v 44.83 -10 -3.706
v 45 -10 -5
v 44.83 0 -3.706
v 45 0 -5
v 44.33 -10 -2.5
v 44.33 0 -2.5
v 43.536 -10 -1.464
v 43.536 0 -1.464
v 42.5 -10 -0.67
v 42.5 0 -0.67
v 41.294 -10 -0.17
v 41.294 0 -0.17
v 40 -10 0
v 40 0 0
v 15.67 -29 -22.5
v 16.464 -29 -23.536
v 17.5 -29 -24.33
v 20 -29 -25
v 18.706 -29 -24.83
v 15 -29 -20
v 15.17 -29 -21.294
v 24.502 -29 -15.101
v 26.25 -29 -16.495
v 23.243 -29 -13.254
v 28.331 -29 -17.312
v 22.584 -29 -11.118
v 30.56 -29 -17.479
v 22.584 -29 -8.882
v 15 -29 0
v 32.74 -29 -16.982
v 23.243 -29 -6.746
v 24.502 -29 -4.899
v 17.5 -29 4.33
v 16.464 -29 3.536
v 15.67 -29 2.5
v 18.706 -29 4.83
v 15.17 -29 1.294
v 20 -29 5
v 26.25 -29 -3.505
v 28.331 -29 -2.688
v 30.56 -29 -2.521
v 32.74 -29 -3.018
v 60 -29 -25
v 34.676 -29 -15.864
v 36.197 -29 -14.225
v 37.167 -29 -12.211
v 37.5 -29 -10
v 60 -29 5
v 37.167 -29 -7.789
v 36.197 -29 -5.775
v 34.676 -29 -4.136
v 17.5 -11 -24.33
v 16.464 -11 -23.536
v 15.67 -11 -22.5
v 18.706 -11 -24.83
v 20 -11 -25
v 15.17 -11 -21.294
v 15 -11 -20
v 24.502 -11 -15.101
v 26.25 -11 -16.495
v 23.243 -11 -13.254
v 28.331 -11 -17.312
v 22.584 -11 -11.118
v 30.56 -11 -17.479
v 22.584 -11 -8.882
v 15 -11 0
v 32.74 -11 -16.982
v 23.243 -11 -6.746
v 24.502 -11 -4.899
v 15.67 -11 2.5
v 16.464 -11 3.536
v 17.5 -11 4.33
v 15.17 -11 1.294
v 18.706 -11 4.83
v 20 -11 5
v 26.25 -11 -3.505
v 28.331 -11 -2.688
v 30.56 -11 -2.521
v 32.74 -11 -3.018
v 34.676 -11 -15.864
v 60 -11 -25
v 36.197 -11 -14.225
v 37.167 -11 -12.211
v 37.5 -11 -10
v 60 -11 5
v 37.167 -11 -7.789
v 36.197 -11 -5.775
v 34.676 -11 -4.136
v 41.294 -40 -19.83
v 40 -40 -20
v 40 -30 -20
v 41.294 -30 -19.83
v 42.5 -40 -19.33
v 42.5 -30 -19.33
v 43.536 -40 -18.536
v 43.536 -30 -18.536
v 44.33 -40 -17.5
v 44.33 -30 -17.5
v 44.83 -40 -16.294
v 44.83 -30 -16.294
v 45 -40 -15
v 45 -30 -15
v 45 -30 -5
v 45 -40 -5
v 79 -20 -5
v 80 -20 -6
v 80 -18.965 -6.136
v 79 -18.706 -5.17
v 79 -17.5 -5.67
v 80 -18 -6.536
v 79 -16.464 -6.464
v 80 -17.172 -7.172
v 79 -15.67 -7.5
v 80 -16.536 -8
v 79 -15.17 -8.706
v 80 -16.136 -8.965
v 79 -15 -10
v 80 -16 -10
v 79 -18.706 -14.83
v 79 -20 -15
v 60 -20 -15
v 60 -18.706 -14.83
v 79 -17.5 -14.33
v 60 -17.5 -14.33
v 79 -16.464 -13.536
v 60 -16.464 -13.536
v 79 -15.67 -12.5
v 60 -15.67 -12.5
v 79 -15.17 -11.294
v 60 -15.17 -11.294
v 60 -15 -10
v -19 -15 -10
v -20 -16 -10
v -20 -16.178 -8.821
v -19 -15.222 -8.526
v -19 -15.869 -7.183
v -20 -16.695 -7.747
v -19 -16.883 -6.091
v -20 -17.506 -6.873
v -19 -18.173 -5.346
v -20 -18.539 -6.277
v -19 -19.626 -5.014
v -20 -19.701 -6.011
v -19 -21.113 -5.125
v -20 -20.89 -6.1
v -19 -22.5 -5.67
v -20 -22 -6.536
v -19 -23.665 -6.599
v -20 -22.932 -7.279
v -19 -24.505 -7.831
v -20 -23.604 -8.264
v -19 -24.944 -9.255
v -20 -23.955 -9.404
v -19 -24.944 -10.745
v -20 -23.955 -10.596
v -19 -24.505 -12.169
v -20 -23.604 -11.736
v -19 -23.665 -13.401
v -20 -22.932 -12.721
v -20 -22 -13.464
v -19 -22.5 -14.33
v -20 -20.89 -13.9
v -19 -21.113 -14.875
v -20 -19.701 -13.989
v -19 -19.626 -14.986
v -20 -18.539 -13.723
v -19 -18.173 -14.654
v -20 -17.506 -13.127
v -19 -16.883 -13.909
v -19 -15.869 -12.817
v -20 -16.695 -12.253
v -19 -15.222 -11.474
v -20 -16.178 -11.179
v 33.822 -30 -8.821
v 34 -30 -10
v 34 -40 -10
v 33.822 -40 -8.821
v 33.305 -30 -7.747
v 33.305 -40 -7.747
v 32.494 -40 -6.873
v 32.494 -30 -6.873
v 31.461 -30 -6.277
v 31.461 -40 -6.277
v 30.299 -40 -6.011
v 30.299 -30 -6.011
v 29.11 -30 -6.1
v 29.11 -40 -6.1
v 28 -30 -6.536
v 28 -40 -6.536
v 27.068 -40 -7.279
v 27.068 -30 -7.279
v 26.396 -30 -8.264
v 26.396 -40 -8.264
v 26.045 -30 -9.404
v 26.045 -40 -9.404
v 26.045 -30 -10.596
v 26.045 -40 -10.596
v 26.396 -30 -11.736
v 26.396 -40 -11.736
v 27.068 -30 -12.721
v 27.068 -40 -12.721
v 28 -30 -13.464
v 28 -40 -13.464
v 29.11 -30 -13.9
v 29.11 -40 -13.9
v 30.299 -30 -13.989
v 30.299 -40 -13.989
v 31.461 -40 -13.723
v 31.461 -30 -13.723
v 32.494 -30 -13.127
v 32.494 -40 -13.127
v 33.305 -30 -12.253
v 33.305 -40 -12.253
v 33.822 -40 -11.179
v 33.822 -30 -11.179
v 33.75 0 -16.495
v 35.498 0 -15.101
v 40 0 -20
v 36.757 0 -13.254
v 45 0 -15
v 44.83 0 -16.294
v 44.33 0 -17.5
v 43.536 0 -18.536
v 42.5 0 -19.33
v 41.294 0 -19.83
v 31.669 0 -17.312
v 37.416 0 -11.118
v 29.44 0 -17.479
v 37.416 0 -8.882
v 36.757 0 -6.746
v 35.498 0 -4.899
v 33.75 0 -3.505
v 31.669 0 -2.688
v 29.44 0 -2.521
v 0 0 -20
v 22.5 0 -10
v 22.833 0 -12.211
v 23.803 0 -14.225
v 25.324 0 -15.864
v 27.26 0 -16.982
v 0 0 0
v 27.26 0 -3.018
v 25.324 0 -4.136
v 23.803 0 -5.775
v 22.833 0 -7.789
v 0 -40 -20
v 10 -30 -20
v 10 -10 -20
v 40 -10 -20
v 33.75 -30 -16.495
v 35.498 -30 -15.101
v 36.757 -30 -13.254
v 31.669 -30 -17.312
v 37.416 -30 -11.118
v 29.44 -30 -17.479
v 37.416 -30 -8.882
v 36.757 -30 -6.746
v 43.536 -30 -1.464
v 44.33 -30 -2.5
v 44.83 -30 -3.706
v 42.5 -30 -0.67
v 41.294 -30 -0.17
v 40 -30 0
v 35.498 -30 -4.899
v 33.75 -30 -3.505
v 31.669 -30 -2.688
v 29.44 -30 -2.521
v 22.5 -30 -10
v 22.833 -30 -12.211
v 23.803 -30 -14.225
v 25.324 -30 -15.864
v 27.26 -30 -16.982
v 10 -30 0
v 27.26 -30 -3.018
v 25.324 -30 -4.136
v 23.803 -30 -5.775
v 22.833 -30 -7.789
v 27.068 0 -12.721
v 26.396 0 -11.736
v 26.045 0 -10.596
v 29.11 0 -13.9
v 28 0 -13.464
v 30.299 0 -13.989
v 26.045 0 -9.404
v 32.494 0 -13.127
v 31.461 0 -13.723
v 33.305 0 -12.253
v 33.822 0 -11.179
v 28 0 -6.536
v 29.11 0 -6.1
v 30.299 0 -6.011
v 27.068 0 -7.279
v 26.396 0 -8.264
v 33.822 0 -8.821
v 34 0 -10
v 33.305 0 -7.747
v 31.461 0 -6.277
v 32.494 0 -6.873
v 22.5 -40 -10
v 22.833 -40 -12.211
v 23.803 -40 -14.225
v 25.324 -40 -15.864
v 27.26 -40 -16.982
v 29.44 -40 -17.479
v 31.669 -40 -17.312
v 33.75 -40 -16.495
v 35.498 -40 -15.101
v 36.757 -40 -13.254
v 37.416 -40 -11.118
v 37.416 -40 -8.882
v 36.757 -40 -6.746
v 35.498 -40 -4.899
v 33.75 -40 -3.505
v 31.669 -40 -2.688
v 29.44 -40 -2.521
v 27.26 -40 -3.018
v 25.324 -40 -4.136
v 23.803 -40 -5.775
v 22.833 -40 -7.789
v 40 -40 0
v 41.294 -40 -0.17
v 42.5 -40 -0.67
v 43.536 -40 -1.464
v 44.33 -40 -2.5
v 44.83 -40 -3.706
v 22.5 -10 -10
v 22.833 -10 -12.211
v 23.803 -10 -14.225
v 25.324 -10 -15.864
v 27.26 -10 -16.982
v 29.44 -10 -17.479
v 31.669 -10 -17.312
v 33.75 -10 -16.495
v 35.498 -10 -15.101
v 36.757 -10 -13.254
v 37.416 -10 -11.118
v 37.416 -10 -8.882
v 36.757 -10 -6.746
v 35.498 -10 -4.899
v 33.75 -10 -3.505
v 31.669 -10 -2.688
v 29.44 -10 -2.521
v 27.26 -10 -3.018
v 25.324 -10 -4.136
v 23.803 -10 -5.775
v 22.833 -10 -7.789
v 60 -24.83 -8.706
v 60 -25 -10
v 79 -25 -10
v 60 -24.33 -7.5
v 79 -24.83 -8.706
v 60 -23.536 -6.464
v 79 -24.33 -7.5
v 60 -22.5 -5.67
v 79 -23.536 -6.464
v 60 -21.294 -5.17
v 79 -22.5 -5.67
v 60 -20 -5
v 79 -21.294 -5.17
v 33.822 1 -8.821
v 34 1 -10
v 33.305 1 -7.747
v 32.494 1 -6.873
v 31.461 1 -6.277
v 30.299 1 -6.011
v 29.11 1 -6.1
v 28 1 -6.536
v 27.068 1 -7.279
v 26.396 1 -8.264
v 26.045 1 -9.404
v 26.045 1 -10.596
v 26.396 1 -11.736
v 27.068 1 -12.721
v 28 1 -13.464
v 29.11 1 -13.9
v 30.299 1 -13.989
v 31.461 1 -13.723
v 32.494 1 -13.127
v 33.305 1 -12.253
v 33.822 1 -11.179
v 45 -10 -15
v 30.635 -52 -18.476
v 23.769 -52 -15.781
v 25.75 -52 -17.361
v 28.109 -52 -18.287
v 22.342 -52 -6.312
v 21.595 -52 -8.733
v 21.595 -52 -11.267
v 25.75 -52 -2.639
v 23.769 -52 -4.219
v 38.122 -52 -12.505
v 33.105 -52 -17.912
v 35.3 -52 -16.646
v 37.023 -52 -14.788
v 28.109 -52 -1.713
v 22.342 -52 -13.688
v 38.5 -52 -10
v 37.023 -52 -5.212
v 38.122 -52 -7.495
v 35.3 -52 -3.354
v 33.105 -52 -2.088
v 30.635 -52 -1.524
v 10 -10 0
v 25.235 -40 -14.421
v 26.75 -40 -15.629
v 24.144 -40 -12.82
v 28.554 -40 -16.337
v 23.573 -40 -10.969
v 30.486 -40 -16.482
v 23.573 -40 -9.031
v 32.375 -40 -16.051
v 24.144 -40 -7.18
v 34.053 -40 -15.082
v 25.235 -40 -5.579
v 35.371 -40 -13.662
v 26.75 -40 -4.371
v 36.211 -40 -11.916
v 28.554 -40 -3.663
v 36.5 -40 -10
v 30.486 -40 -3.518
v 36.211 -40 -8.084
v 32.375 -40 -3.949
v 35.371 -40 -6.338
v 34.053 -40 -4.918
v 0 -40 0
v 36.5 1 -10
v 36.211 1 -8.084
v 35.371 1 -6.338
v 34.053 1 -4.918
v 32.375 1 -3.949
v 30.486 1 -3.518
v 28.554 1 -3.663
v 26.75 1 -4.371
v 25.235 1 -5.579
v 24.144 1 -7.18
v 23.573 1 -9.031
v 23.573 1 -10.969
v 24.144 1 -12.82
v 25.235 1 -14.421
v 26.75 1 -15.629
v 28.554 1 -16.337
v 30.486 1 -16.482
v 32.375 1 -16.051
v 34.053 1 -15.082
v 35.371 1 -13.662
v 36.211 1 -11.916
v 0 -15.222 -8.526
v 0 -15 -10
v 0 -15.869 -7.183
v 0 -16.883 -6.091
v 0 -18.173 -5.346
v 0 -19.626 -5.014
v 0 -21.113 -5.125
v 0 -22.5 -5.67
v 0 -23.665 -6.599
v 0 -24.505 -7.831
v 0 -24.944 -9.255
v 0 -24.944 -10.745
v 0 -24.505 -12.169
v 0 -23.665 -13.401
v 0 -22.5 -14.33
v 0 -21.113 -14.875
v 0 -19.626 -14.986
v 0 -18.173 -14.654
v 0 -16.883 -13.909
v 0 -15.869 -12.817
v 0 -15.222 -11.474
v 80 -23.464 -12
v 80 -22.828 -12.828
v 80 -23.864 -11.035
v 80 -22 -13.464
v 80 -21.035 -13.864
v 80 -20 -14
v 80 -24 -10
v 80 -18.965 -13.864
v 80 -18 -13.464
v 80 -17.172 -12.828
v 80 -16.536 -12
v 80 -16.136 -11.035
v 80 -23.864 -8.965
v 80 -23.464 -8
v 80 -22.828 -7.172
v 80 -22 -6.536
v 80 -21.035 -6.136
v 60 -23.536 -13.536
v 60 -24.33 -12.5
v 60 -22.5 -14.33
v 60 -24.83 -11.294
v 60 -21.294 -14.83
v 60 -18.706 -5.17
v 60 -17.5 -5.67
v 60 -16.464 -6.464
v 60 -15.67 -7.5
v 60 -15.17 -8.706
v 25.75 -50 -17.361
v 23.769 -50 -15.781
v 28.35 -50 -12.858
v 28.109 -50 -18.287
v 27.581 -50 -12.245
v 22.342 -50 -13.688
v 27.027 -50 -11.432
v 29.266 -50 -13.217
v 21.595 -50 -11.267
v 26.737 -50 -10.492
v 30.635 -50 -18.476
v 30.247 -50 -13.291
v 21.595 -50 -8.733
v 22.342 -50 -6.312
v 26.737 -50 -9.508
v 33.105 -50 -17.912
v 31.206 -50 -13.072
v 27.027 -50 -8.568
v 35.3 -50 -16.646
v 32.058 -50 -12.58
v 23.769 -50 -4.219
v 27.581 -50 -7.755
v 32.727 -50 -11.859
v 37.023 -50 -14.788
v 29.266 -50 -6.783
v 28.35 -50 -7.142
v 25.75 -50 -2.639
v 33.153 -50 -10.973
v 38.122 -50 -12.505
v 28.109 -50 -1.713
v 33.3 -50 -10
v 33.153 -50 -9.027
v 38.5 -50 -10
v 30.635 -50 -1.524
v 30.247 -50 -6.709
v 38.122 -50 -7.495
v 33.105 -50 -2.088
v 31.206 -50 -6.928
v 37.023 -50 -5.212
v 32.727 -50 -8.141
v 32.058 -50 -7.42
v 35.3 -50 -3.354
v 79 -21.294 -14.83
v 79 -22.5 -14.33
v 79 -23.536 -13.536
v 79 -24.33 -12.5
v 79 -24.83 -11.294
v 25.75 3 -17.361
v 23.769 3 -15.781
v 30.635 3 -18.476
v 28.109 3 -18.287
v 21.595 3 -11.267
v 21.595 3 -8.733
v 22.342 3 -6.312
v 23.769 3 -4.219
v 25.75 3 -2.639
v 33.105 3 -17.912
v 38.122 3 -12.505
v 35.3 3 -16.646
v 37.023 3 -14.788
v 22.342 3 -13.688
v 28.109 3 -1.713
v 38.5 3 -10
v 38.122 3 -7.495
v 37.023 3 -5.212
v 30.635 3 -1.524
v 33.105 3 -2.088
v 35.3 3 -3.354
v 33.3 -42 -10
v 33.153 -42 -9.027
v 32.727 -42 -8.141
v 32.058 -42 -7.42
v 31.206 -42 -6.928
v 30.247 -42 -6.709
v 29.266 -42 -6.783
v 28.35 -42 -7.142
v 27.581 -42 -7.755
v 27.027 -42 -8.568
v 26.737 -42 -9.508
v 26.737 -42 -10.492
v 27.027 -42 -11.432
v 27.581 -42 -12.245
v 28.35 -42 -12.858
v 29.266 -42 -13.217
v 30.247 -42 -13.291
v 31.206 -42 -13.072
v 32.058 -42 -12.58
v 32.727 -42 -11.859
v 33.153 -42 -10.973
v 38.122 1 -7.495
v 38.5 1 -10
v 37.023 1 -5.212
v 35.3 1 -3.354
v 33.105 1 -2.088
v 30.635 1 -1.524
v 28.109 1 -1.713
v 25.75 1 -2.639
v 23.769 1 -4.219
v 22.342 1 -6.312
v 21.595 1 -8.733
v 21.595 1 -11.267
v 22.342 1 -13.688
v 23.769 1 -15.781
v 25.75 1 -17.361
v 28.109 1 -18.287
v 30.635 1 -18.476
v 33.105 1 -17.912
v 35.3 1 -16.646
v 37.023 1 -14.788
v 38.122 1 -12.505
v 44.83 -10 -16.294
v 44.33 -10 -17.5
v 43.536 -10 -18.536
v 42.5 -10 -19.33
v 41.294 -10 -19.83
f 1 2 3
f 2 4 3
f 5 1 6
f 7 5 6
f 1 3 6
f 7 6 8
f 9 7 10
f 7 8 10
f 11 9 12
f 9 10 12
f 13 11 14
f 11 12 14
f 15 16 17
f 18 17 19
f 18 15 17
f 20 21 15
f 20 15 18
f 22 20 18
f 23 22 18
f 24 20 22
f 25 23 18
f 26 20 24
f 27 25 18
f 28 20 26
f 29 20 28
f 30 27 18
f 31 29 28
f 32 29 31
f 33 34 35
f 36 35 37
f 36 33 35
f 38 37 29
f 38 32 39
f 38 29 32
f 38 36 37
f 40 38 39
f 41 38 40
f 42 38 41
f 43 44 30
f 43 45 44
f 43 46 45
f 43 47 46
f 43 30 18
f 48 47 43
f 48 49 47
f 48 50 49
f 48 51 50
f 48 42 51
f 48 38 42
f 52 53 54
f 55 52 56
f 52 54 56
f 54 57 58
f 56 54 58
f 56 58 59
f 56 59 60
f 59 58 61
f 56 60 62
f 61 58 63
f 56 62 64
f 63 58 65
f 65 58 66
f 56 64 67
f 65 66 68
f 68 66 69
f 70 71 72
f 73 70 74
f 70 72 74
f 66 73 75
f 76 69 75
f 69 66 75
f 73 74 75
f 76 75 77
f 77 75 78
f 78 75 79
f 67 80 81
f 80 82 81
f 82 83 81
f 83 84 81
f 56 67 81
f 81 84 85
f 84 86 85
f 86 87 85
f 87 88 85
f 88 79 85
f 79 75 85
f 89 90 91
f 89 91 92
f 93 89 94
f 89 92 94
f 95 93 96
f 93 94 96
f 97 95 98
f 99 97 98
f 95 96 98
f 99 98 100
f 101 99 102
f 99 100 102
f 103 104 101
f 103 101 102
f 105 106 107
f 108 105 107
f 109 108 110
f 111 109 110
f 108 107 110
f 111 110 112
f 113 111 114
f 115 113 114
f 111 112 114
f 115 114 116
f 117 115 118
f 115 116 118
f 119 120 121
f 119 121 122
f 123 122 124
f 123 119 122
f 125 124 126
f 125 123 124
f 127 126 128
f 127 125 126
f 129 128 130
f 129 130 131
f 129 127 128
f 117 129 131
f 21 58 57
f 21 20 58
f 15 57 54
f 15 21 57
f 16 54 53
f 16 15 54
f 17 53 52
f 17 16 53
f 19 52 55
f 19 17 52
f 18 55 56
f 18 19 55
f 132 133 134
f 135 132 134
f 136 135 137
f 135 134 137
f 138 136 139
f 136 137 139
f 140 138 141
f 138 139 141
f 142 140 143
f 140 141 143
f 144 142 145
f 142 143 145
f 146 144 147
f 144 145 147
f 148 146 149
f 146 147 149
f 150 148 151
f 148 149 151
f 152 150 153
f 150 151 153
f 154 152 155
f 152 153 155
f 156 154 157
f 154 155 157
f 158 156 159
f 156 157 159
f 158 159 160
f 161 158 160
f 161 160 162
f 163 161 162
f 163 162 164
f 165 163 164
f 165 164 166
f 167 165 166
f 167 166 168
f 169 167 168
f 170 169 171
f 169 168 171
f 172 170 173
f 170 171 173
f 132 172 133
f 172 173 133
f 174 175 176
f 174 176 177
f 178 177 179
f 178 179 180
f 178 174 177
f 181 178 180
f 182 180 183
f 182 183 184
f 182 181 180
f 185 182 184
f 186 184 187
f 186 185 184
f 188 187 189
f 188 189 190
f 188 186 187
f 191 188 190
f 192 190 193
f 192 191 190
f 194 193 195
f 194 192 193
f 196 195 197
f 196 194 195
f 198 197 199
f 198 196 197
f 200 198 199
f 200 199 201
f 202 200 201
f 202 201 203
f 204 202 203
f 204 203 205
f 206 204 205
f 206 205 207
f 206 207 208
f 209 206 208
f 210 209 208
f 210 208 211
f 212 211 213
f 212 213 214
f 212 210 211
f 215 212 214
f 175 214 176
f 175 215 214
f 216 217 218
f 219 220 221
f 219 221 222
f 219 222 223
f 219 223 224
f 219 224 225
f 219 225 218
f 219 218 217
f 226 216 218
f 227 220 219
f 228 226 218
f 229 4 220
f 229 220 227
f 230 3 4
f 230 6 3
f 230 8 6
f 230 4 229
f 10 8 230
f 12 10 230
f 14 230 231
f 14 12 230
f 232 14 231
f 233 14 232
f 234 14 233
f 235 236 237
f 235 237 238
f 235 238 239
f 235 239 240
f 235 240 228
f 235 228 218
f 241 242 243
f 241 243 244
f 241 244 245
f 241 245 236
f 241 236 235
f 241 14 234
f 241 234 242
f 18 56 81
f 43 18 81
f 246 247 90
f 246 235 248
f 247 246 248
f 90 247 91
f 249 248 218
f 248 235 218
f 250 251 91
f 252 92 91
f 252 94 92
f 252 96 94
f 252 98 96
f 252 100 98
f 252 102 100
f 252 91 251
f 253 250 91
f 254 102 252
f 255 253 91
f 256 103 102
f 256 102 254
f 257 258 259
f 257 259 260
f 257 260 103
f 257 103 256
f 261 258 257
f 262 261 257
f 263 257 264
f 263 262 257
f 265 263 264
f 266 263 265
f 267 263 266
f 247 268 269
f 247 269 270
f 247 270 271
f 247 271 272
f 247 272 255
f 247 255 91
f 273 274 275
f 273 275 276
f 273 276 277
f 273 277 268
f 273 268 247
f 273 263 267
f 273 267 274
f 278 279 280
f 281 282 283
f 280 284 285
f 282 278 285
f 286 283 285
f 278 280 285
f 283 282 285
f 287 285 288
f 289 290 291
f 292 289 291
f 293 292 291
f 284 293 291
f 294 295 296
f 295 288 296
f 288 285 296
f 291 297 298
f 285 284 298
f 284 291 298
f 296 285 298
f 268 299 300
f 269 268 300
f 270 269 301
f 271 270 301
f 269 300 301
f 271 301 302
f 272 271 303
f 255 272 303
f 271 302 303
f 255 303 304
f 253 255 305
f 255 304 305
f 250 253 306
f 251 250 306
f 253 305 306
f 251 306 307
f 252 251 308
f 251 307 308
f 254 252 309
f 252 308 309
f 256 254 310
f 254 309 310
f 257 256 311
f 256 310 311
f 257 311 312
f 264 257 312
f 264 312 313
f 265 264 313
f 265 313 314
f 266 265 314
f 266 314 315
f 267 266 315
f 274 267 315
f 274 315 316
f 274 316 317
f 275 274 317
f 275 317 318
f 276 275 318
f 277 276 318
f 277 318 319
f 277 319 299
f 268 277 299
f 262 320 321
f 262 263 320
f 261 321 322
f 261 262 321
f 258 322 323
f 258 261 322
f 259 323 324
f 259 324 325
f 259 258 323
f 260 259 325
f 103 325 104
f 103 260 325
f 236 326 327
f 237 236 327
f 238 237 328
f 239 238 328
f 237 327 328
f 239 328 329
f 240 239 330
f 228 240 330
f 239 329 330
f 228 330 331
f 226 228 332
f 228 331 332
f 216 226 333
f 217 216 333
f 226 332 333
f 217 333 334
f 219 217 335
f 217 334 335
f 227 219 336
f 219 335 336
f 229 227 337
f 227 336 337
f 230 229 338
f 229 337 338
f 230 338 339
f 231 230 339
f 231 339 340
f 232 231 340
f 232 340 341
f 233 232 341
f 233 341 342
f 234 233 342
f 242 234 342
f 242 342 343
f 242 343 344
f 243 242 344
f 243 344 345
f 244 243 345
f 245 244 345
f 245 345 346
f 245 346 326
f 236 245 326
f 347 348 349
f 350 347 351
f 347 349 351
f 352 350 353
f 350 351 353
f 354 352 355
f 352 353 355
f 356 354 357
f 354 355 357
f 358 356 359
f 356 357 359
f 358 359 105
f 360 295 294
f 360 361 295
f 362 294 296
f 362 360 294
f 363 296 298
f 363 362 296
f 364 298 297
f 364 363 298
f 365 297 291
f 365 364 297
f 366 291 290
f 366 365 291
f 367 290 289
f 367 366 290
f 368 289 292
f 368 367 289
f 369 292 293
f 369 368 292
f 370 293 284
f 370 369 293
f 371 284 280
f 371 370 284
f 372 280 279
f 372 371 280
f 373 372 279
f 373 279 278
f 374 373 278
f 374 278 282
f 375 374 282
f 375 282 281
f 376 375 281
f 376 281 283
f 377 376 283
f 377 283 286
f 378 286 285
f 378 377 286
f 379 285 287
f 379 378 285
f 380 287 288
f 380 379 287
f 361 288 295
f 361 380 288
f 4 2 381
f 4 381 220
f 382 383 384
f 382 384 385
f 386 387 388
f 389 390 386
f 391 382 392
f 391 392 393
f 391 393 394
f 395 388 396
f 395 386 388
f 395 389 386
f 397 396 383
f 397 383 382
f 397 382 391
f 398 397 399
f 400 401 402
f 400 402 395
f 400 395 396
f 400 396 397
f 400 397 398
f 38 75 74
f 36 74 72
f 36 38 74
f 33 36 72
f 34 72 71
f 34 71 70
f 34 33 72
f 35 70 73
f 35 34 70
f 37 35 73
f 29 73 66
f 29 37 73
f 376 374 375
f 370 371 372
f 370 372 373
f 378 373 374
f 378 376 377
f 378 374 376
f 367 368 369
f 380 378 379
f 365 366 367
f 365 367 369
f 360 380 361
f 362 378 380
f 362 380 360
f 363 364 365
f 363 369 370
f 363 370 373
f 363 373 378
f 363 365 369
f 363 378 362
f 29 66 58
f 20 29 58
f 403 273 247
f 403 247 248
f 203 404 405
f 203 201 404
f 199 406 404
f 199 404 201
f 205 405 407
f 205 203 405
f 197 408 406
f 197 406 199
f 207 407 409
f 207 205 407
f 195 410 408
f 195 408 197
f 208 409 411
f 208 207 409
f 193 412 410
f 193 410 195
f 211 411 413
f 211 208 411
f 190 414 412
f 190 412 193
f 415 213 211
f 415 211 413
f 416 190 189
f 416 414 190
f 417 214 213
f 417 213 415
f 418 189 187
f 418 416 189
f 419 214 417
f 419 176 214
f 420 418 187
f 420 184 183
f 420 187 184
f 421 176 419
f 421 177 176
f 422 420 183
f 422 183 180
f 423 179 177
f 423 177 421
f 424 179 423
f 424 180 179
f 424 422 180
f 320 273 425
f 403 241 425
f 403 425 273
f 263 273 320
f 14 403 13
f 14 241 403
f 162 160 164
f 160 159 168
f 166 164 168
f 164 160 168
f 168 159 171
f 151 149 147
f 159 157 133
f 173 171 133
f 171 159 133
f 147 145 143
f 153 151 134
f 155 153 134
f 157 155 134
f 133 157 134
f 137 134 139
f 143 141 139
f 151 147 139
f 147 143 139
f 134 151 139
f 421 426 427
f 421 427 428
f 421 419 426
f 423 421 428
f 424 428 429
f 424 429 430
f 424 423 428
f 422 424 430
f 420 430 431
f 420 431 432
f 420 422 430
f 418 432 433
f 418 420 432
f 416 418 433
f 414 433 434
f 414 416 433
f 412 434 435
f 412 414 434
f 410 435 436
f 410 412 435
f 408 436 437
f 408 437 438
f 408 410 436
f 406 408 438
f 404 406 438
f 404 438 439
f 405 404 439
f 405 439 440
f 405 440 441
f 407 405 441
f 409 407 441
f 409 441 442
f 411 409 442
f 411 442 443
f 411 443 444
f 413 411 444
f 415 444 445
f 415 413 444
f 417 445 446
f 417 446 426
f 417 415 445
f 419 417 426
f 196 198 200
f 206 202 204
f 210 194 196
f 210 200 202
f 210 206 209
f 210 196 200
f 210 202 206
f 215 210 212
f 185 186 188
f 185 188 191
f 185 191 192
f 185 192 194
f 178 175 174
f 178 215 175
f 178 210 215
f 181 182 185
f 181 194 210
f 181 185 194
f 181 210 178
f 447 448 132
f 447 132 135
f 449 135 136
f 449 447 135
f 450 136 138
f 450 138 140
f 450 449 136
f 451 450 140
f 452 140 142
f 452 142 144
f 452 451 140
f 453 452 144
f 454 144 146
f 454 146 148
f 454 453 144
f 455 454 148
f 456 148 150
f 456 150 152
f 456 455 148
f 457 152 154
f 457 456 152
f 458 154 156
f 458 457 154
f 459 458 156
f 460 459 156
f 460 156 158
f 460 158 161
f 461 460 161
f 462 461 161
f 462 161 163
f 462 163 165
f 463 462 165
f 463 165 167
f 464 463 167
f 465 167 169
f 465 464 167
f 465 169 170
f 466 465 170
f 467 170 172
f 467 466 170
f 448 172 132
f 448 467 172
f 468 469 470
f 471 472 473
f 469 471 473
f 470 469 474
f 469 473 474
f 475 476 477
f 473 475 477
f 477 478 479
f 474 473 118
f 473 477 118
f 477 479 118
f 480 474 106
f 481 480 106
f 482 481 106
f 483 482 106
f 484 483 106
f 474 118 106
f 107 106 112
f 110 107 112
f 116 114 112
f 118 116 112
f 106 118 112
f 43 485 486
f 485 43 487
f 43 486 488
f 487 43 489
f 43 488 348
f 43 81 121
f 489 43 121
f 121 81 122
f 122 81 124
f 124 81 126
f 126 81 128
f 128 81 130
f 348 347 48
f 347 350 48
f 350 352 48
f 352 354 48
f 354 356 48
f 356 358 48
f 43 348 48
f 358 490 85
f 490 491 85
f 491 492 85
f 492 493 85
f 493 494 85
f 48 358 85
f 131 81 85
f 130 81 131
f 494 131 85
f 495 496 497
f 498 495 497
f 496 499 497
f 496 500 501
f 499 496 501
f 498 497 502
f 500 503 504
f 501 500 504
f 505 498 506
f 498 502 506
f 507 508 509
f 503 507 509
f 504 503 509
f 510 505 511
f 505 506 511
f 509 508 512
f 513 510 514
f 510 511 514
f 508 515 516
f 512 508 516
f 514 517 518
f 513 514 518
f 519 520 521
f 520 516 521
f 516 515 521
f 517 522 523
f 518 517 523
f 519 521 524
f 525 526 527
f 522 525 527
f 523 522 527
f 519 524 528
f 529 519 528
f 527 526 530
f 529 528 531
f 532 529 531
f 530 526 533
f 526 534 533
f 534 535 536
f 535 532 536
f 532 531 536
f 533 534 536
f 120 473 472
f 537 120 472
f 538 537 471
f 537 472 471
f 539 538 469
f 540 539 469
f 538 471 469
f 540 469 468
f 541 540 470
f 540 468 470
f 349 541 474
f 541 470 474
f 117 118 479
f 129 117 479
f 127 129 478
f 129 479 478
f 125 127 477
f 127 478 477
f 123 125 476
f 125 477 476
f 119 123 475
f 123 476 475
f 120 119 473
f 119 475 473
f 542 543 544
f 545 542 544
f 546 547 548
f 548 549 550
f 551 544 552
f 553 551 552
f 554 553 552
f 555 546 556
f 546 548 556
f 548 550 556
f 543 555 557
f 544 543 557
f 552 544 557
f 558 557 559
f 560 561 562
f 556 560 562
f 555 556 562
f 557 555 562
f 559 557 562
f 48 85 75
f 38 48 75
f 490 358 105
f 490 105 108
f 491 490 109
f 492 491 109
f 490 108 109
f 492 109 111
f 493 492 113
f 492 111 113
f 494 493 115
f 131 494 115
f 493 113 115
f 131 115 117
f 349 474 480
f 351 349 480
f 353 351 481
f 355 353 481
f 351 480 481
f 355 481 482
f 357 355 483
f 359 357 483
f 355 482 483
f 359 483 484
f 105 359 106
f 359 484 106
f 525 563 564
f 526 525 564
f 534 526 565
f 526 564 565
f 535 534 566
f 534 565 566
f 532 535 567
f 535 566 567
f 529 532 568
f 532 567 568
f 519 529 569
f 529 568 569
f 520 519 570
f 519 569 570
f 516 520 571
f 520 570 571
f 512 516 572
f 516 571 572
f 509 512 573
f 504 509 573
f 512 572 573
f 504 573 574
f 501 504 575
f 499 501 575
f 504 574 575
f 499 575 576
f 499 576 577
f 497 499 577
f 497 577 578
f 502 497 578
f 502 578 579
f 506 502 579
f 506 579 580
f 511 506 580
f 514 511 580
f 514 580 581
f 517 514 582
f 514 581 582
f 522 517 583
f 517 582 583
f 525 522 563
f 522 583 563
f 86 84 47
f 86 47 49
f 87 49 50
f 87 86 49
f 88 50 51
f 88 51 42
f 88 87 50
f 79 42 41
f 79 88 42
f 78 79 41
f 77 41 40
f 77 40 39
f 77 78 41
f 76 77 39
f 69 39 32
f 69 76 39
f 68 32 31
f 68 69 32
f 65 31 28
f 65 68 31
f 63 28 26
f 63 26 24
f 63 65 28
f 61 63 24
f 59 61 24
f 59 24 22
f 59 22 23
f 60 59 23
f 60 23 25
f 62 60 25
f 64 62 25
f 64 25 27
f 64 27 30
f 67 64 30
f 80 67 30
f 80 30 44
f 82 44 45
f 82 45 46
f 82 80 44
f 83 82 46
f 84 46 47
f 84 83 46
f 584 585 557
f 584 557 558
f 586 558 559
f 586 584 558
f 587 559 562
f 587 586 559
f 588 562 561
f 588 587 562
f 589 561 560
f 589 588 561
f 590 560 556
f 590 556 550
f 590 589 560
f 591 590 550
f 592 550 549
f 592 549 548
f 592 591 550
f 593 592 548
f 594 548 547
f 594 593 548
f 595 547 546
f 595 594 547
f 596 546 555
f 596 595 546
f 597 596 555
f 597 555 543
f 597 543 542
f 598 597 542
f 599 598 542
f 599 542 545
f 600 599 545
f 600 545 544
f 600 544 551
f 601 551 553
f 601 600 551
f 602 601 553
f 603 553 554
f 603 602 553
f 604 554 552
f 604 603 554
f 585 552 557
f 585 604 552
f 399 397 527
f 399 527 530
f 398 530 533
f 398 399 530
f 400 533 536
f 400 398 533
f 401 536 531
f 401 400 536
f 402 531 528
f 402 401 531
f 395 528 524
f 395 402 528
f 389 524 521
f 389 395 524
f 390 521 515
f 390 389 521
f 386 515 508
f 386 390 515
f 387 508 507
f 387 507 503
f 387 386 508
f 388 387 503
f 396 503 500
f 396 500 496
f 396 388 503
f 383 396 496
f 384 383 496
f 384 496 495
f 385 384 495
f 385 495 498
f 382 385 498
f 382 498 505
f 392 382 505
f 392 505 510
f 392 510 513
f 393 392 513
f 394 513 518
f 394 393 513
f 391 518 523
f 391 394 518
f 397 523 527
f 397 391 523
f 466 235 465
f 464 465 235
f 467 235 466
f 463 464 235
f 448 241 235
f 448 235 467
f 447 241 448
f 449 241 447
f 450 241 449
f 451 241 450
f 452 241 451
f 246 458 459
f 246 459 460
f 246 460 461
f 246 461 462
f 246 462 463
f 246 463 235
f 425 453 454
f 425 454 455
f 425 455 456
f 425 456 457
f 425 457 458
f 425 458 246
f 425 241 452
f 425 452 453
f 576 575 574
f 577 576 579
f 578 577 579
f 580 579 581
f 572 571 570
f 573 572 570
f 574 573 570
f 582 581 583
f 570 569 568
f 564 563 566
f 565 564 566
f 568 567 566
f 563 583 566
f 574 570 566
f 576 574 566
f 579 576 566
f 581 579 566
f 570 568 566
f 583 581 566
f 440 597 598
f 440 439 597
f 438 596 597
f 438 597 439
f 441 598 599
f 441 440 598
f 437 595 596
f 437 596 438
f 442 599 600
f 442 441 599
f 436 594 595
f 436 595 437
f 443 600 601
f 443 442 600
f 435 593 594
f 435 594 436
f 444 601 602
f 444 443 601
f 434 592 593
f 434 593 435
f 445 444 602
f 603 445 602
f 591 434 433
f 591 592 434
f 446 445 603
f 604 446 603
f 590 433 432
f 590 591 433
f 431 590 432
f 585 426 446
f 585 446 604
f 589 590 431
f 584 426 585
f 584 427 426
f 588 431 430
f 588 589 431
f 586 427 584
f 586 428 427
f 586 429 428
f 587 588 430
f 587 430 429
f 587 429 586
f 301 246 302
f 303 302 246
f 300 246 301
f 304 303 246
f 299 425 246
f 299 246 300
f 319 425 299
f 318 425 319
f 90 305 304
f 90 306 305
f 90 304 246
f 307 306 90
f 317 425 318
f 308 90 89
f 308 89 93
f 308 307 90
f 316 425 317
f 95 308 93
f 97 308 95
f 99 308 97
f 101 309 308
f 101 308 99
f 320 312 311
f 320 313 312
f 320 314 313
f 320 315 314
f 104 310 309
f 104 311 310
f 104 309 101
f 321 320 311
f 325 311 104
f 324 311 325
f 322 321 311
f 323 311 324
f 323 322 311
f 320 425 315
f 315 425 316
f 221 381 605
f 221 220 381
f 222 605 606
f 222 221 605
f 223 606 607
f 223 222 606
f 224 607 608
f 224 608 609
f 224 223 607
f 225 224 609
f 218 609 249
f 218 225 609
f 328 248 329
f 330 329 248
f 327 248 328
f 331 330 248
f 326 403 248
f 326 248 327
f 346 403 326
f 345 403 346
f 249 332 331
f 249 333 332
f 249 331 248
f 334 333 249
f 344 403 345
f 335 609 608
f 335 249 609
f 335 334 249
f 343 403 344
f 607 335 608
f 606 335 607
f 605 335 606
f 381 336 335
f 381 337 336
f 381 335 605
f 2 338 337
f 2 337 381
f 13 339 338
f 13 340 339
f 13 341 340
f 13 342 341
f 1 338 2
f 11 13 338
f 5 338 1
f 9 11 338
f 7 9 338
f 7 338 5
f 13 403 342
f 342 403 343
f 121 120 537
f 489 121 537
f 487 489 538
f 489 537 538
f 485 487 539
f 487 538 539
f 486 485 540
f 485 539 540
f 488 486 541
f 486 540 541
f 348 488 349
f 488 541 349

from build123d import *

# Parameters (mm, degrees)
F0_R          = 5
F1_DEPTH      = 20
F3_DEPTH      = 20
F4_R          = 5
F6_D          = 15
F7_SIZE       = 1
F5_R          = 6.5
F5_R_2        = 4
F8_DEPTH      = 40
F8_DEPTH_BACK = 1
F9_START      = 11
F5_R_3        = 7.5
F9_DEPTH      = 18
F10_R         = 5
F11_START     = 15
F5_W          = 20
F5_H          = 10
F11_DEPTH     = 10
F12_R         = 4.99999
F13_SIZE      = 1
F15_START     = -1
F14_R         = 8.5
F15_DEPTH     = 2
F16_START     = -8
F16_DEPTH     = 2
F5_R_4        = 3.3
F18_DEPTH     = 30
F19_START     = 42
F19_DEPTH     = 8


# Not quite as in the source:
# - a fillet or chamfer is up to 0.001 mm smaller than in the source, because OpenCascade refuses the exact size
# - a feature names something its author has since deleted; it is built from what else it names


with BuildPart() as f1:
    # F0 (on Right) → F1 (new body)
    with BuildSketch(Plane.YZ):
        with Locations((-20, -10)):
            Circle(F0_R)
    extrude(amount=-F1_DEPTH)

    # F2 (on Top) → F3 (join)
    with BuildSketch(Plane.XY):
        Polygon((45, 0), (0, 0), (0, -40), (45, -40), (45, -30), (15, -30), (10, -30), (10, -10), (15, -10), (45, -10), align=None)
    extrude(amount=-F3_DEPTH)

    # F4
    f4_edges = [f1.edges().sort_by_distance(p)[0] for p in [
        (45, -35, 0),
        (45, -5, 0),
        (45, -35, -20),
        (45, -5, -20),
    ]]
    fillet(f4_edges, radius=F4_R)

    # F6 (through all)
    with Locations(Plane(origin=(0, 0, 0), x_dir=(1, 0, 0), z_dir=(0, 1, 0))):
        with Locations((30, 10)):
            Hole(F6_D / 2)

    # F7
    f7_edges = [f1.edges().sort_by_distance(p)[0] for p in [
        (-20, -25, -10),
    ]]
    chamfer(f7_edges, length=F7_SIZE)


with BuildPart() as f8:
    # F5 (on Front) → F8 (new body, two sides)
    with BuildSketch(Plane.XZ) as f8_sk:
        with Locations((30, -10)):
            Circle(F5_R)
        with Locations((30, -10)):
            Circle(F5_R_2, mode=Mode.SUBTRACT)
    extrude(amount=F8_DEPTH)
    extrude(f8_sk.sketch, amount=-F8_DEPTH_BACK)

    # F14 (on Front) → F15 (join)
    with BuildSketch(Plane.XZ.offset(F15_START)):
        with Locations((30, -10)):
            Circle(F14_R)
    extrude(amount=-F15_DEPTH)

    # F5 (on Front) → F18 (join)
    with BuildSketch(Plane.XZ):
        with Locations((30, -10)):
            Circle(F5_R_2)
        with Locations((30, -10)):
            Circle(F5_R_4, mode=Mode.SUBTRACT)
        with Locations((30, -10)):
            Circle(F5_R_4)
    extrude(amount=F18_DEPTH)


with BuildPart() as f9:
    # F5 (on Front) → F9 (new body)
    with BuildSketch(Plane.XZ.offset(F9_START)):
        Polygon((60, 5), (15, 5), (15, -25), (60, -25), (60, -15), (60, -5), align=None)
        with Locations((30, -10)):
            Circle(F5_R_3, mode=Mode.SUBTRACT)
    extrude(amount=F9_DEPTH)

    # F10
    f10_edges = [f9.edges().sort_by_distance(p)[0] for p in [
        (15, -20, 5),
        (15, -20, -25),
    ]]
    fillet(f10_edges, radius=F10_R)

    # F5 (on Front) → F11 (join)
    with BuildSketch(Plane.XZ.offset(F11_START)):
        with Locations((70, -10)):
            Rectangle(F5_W, F5_H)
    extrude(amount=F11_DEPTH)

    # F12 (radius 5 in the source; OpenCascade refuses exactly that, so slightly less here)
    f12_edges = [f9.edges().sort_by_distance(p)[0] for p in [
        (70, -25, -5),
        (70, -15, -5),
        (70, -15, -15),
        (70, -25, -15),
    ]]
    fillet(f12_edges, radius=F12_R)

    # F13
    f13_edges = [f9.edges().sort_by_distance(p)[0] for p in [
        (80, -20, -15),
        (80, -16.464463, -13.535537),
        (80, -23.535537, -13.535537),
        (80, -15, -10),
        (80, -25, -10),
        (80, -16.464463, -6.464463),
        (80, -23.535537, -6.464463),
        (80, -20, -5),
    ]]
    chamfer(f13_edges, length=F13_SIZE)


with BuildPart() as f16:
    # F14 (on Front) → F16 (new body)
    with BuildSketch(Plane.XZ.offset(F16_START)):
        with Locations((30, -10)):
            Circle(F14_R)
    extrude(amount=-F16_DEPTH)


with BuildPart() as f16_1:
    # F17: moved
    add(f16.part.moved(Location((0, -60, 0))))

    # F5 (on Front) → F19 (join)
    with BuildSketch(Plane.XZ.offset(F19_START)):
        with Locations((30, -10)):
            Circle(F5_R_4)
    extrude(amount=F19_DEPTH)


solid = Compound([f1.part, f8.part, f9.part, f16_1.part])
